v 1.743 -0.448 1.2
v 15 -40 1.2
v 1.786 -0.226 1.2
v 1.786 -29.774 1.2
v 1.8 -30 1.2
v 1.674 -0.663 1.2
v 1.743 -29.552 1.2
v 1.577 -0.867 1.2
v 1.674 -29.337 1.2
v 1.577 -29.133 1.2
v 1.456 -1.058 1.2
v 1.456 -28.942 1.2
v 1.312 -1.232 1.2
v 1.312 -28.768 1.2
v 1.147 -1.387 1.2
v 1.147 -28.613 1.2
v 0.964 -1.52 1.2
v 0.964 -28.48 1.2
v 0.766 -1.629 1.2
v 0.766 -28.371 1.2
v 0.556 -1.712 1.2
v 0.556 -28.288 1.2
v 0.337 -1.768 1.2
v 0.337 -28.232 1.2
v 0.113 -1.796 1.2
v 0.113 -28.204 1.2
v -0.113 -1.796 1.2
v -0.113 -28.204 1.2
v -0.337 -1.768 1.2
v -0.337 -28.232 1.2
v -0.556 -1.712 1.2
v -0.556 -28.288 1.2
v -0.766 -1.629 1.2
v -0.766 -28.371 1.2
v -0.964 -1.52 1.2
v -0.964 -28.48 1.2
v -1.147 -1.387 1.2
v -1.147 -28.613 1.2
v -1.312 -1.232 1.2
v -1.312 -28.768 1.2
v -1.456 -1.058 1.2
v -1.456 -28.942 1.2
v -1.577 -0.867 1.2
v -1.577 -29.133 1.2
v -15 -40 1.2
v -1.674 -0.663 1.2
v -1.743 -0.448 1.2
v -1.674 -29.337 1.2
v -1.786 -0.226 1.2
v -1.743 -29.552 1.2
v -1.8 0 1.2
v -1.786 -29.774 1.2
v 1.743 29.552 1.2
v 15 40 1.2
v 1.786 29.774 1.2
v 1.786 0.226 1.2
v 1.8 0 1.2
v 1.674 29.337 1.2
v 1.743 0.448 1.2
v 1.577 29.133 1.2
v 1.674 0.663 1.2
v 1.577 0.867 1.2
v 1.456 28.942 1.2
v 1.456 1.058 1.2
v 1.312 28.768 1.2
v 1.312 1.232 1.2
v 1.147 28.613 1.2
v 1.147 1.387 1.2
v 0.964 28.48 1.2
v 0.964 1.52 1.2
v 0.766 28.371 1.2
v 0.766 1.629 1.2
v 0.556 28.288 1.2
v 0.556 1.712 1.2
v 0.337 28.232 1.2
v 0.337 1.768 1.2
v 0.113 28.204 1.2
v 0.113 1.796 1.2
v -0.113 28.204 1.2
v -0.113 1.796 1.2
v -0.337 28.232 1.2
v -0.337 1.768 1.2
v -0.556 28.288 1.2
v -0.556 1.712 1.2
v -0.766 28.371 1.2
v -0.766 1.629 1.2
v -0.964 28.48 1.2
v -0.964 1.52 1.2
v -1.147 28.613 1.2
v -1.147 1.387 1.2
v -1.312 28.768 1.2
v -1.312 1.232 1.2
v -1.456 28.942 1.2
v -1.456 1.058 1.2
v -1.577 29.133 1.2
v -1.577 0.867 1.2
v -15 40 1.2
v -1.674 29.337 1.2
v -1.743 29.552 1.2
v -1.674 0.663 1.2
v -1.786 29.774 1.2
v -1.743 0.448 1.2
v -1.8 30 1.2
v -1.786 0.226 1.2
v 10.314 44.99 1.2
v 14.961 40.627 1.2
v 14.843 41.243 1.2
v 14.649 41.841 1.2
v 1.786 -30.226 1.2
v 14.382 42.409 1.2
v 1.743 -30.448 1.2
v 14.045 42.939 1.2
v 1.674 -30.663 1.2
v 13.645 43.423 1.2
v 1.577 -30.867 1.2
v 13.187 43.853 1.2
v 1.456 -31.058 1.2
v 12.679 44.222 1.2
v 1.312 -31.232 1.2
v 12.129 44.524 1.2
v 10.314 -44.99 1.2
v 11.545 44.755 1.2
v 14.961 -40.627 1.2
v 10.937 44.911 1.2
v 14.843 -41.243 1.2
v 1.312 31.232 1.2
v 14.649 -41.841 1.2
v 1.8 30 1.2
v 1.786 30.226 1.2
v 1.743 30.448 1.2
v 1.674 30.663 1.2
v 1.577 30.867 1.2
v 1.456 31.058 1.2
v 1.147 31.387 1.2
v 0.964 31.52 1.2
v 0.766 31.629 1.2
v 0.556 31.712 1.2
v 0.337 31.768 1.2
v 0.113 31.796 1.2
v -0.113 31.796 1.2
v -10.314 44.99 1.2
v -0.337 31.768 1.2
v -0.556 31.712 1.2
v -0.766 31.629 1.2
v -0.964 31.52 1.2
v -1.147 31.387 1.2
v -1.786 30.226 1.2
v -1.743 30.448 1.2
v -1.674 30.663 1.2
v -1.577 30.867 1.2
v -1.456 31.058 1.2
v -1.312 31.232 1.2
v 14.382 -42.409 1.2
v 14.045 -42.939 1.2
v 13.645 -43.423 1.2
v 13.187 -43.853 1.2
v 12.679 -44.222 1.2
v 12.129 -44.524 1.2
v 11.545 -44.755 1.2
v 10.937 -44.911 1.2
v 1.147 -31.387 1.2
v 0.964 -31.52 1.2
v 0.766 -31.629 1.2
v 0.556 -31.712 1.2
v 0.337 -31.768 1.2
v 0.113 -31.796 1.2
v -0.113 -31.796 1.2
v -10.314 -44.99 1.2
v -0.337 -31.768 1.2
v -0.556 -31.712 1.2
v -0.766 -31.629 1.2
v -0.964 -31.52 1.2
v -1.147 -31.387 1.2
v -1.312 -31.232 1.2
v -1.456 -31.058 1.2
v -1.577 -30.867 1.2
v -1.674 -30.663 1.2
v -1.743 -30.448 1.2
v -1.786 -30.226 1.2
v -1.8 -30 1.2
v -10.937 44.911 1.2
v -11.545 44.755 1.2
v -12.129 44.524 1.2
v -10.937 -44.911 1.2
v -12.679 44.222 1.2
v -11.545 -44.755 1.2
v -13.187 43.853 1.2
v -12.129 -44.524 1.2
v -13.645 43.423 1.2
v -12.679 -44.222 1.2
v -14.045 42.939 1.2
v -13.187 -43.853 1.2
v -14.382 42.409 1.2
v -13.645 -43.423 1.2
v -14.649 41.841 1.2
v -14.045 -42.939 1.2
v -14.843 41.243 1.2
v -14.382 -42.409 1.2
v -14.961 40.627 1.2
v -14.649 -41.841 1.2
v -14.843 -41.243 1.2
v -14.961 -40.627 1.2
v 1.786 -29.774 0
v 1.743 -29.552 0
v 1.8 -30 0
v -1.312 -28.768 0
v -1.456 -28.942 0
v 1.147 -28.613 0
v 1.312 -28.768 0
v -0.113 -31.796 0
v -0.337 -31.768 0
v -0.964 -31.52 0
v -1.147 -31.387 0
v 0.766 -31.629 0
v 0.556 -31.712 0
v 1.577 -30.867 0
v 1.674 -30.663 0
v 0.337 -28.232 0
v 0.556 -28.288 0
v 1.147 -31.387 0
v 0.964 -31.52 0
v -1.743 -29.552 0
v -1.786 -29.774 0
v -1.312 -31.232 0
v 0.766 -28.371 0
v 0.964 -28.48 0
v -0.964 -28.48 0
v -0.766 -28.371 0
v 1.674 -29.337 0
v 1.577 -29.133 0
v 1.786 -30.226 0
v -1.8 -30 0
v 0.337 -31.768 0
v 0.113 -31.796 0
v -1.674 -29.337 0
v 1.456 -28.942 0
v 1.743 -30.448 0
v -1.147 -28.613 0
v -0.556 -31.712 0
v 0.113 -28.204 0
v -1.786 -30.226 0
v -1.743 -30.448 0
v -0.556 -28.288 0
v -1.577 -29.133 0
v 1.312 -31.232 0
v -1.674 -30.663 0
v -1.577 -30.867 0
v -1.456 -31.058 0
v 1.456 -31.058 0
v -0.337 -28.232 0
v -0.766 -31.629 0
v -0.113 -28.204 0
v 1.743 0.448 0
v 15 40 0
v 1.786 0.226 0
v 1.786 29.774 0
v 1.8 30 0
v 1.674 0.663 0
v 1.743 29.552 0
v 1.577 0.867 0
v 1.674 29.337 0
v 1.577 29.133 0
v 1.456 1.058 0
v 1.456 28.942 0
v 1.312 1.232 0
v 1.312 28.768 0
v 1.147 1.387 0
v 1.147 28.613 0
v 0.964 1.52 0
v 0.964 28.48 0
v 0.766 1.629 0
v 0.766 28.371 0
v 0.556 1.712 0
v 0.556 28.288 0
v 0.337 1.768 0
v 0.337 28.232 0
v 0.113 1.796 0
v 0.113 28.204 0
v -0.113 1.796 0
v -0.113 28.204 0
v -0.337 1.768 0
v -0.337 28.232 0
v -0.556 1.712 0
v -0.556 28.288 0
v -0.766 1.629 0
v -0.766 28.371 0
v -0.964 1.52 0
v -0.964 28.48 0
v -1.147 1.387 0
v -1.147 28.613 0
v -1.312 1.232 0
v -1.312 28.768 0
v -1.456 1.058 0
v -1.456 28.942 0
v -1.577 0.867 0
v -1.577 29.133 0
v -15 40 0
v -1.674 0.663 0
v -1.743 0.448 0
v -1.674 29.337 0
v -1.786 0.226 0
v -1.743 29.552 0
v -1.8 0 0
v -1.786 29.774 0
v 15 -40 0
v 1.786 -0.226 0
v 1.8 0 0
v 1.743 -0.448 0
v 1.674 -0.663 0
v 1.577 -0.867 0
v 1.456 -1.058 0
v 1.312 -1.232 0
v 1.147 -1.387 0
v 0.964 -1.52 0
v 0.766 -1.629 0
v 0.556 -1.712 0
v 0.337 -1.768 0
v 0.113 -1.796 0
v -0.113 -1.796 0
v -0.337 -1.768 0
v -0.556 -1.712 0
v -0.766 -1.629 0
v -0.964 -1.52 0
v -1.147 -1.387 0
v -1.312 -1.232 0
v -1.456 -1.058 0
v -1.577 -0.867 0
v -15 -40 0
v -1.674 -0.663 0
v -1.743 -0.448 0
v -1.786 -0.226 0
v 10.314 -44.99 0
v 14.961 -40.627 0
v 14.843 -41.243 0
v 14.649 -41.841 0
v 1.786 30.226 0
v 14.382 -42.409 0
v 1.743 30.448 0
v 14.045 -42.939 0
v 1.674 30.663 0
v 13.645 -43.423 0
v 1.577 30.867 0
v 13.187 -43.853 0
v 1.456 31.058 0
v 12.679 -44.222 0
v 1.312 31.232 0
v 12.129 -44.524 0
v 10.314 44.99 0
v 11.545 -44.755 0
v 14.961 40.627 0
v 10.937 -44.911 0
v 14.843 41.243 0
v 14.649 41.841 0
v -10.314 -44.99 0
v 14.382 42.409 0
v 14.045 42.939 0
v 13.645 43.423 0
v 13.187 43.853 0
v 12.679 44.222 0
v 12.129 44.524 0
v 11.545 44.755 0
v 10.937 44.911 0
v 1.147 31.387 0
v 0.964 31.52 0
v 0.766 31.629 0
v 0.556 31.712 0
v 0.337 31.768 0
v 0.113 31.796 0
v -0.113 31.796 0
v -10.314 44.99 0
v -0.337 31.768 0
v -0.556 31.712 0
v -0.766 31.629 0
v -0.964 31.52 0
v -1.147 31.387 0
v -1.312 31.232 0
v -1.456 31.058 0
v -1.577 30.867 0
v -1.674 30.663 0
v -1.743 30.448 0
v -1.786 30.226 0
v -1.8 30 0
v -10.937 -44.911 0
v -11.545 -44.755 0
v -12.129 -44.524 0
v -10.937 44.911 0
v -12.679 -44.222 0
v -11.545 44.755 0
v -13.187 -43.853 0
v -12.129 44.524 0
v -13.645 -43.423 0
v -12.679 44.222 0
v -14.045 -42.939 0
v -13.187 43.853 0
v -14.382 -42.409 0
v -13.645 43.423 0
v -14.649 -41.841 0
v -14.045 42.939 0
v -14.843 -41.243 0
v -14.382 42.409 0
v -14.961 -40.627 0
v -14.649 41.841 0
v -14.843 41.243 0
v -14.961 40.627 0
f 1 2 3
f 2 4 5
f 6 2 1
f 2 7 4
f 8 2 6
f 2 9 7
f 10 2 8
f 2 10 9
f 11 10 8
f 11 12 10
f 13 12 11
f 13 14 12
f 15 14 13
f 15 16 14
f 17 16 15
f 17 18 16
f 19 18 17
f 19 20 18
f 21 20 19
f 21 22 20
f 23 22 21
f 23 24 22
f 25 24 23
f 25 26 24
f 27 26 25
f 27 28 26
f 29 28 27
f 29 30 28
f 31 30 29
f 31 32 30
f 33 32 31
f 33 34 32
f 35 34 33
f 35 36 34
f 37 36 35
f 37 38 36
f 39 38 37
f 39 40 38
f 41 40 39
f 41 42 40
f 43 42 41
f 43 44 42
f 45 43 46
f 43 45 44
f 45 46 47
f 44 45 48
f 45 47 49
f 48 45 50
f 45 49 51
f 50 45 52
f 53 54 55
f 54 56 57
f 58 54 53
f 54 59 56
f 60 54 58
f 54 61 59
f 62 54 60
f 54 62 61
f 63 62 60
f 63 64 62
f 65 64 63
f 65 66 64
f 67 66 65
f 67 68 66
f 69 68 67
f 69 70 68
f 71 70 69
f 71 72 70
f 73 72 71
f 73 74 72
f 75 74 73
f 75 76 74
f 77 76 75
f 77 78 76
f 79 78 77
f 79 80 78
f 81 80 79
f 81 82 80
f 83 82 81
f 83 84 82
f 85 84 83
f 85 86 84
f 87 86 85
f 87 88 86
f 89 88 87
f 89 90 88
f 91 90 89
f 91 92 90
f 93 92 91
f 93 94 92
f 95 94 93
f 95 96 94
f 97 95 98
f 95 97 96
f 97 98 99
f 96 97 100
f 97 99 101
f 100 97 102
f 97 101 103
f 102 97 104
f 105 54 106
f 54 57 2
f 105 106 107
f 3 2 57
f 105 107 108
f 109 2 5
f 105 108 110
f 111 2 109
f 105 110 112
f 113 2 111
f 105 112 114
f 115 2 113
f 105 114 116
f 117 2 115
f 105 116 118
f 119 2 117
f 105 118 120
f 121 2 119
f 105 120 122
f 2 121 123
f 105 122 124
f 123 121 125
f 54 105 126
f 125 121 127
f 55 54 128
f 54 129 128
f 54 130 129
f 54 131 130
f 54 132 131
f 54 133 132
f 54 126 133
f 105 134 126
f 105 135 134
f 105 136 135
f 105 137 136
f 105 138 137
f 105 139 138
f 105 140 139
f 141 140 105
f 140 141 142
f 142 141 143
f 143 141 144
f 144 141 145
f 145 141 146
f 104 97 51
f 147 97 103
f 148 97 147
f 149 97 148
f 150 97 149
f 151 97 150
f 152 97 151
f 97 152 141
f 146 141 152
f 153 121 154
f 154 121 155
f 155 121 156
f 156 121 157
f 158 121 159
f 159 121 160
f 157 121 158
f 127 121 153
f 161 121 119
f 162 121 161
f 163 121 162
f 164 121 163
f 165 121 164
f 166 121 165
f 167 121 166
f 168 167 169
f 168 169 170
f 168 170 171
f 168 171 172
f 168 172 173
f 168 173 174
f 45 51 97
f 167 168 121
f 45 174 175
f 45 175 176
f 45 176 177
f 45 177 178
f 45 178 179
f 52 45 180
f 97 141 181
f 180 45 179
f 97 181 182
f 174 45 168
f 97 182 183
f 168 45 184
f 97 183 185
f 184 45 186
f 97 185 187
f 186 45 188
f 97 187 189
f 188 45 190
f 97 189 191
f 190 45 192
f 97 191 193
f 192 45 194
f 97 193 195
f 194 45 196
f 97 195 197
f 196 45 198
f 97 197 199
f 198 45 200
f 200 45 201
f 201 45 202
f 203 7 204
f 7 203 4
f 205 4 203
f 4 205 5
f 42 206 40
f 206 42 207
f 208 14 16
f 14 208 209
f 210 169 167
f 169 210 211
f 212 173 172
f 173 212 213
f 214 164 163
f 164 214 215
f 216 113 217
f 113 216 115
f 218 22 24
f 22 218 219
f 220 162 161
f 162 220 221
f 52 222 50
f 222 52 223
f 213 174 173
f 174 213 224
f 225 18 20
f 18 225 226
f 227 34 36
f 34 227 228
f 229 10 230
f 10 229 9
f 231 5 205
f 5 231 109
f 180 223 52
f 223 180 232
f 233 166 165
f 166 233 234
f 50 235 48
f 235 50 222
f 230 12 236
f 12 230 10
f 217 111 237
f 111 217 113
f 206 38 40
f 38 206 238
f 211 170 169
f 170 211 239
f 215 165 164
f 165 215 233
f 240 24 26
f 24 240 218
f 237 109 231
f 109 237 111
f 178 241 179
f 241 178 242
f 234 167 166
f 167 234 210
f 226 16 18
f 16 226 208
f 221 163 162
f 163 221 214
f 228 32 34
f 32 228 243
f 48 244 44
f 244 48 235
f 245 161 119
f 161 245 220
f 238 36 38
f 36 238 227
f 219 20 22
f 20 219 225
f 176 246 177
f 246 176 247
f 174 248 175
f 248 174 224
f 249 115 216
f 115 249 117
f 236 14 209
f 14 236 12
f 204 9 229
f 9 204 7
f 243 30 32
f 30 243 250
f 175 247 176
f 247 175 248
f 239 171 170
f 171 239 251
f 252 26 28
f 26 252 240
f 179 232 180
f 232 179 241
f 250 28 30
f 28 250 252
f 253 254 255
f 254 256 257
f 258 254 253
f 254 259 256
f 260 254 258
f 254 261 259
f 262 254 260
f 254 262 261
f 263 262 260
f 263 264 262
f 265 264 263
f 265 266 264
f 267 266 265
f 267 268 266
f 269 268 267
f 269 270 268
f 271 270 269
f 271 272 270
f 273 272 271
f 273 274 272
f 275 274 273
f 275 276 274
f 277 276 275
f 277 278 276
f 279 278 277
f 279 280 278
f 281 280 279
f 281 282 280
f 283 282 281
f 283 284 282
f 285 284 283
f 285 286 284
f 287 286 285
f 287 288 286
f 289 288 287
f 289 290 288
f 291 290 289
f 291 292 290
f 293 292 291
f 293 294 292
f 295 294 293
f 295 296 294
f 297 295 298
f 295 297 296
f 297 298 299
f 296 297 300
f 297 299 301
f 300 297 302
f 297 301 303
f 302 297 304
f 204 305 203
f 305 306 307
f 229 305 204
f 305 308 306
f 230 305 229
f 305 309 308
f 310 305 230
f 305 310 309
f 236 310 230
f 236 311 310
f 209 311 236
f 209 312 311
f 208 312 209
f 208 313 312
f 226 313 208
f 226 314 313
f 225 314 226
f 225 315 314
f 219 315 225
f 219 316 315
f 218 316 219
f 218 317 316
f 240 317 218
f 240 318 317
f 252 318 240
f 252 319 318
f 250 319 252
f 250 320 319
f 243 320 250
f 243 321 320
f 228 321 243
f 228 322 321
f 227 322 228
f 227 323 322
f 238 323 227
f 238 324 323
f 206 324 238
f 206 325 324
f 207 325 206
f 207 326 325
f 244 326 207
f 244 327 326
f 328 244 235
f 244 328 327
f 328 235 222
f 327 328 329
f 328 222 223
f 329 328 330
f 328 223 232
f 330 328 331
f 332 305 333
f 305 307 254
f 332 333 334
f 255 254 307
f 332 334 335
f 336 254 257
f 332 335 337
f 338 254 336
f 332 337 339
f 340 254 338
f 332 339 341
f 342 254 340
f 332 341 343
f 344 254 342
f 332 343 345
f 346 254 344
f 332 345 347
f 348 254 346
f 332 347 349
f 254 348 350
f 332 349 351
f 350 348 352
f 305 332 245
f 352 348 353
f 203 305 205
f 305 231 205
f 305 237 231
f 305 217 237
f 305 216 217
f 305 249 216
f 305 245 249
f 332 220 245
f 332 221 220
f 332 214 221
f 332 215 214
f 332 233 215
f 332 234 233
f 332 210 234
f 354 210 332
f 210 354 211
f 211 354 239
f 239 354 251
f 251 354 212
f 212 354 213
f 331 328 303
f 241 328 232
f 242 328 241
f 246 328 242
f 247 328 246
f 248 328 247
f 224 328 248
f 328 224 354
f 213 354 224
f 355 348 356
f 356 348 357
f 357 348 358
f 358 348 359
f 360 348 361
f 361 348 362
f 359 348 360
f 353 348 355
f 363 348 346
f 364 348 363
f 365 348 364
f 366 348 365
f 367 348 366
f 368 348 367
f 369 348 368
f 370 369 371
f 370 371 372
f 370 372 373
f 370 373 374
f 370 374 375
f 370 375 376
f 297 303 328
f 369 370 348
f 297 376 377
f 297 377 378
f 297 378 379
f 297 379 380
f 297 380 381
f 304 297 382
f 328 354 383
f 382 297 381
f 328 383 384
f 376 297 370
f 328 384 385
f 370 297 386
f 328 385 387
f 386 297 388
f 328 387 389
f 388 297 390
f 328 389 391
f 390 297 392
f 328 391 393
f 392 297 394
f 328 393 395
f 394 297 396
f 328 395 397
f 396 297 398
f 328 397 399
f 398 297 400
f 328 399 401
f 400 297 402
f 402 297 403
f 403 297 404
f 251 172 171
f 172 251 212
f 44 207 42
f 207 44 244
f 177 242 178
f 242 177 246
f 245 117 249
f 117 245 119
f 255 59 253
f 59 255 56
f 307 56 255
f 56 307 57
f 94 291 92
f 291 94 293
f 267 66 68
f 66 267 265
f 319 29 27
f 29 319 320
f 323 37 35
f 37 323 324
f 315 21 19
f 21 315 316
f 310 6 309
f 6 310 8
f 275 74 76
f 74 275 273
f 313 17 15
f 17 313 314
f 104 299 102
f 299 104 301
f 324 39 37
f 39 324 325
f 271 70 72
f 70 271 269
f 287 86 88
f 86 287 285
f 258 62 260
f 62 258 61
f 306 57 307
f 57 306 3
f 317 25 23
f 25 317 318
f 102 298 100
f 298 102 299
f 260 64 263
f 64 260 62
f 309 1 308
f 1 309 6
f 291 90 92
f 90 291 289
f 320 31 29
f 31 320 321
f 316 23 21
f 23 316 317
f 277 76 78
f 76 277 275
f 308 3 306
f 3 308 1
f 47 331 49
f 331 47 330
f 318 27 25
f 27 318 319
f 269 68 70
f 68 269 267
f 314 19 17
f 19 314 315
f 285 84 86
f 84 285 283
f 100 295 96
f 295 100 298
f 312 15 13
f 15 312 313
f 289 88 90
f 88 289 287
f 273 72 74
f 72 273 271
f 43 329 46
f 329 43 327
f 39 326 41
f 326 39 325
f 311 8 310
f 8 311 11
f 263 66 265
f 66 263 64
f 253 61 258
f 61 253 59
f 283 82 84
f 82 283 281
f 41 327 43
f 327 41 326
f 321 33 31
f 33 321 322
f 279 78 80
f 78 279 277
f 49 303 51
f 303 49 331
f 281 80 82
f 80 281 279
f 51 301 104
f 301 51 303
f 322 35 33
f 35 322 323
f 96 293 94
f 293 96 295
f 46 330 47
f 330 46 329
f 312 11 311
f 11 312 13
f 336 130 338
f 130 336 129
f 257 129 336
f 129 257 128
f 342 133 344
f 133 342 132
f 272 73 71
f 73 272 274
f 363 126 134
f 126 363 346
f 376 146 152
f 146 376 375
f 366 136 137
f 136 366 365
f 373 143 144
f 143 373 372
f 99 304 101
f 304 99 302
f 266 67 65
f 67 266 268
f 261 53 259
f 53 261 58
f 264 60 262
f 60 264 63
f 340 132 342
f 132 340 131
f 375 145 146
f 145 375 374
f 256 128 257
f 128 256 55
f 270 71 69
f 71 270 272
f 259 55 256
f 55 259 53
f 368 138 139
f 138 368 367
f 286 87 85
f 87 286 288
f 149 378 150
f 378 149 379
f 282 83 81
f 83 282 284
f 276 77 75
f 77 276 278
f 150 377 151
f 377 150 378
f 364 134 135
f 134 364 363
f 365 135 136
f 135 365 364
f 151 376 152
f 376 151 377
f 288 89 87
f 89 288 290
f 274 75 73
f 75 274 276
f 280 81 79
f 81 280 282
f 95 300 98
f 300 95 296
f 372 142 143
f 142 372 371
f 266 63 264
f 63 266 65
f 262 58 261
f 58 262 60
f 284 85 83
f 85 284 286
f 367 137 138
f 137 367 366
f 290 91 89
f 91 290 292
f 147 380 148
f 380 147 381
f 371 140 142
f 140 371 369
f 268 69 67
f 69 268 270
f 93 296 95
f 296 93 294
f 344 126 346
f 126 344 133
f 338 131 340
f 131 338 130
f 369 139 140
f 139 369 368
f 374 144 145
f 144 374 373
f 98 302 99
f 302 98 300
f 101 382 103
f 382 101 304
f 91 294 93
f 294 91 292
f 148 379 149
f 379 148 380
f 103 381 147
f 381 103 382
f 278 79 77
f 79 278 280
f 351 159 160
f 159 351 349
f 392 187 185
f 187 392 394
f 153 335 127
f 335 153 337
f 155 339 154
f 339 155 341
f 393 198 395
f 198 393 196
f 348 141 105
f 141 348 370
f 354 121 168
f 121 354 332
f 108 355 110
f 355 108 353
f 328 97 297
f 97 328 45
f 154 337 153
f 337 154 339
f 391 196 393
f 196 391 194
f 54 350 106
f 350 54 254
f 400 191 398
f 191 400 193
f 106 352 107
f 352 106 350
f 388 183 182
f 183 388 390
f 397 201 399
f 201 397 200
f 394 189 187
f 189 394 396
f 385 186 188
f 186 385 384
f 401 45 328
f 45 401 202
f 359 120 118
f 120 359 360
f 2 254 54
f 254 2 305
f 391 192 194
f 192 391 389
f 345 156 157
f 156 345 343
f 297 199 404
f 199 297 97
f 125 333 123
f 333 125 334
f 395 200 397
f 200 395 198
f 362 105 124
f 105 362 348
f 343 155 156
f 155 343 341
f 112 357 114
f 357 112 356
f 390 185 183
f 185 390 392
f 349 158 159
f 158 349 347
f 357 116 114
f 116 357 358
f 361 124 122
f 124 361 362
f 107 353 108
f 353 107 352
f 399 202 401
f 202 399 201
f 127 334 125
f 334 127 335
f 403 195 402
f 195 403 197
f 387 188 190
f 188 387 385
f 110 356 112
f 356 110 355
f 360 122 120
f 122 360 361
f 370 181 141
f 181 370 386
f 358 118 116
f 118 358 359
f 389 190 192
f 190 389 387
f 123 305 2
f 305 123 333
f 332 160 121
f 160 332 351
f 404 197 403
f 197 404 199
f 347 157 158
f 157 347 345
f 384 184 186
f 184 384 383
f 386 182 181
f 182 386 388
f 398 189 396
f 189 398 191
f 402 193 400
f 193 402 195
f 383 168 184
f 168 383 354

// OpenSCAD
$fn = 50;


difference() {
	union() {
		hull() {
			translate(v = [-10.0000000000, 40.0000000000, 0]) {
				cylinder(h = 21, r = 5);
			}
			translate(v = [10.0000000000, 40.0000000000, 0]) {
				cylinder(h = 21, r = 5);
			}
			translate(v = [-10.0000000000, -40.0000000000, 0]) {
				cylinder(h = 21, r = 5);
			}
			translate(v = [10.0000000000, -40.0000000000, 0]) {
				cylinder(h = 21, r = 5);
			}
		}
	}
	union() {
		translate(v = [0, 0, 1.2000000000]) {
			hull() {
				translate(v = [-10.0000000000, 40.0000000000, 0]) {
					cylinder(h = 19.8000000000, r = 3.8000000000);
				}
				translate(v = [10.0000000000, 40.0000000000, 0]) {
					cylinder(h = 19.8000000000, r = 3.8000000000);
				}
				translate(v = [-10.0000000000, -40.0000000000, 0]) {
					cylinder(h = 19.8000000000, r = 3.8000000000);
				}
				translate(v = [10.0000000000, -40.0000000000, 0]) {
					cylinder(h = 19.8000000000, r = 3.8000000000);
				}
			}
		}
		#translate(v = [0.0000000000, -30.0000000000, 0]) {
			cylinder(h = 1.2000000000, r = 1.8000000000);
		}
		#cylinder(h = 1.2000000000, r = 1.8000000000);
		#translate(v = [0.0000000000, 30.0000000000, 0]) {
			cylinder(h = 1.2000000000, r = 1.8000000000);
		}
		translate(v = [-250.0000000000, -250.0000000000, 1.2000000000]) {
			cube(size = [500, 500, 500]);
		}
		translate(v = [-250.0000000000, -250.0000000000, 1.2000000000]) {
			cube(size = [500, 500, 500]);
		}
		translate(v = [-250.0000000000, -250.0000000000, 1.2000000000]) {
			cube(size = [500, 500, 500]);
		}
	}
}
